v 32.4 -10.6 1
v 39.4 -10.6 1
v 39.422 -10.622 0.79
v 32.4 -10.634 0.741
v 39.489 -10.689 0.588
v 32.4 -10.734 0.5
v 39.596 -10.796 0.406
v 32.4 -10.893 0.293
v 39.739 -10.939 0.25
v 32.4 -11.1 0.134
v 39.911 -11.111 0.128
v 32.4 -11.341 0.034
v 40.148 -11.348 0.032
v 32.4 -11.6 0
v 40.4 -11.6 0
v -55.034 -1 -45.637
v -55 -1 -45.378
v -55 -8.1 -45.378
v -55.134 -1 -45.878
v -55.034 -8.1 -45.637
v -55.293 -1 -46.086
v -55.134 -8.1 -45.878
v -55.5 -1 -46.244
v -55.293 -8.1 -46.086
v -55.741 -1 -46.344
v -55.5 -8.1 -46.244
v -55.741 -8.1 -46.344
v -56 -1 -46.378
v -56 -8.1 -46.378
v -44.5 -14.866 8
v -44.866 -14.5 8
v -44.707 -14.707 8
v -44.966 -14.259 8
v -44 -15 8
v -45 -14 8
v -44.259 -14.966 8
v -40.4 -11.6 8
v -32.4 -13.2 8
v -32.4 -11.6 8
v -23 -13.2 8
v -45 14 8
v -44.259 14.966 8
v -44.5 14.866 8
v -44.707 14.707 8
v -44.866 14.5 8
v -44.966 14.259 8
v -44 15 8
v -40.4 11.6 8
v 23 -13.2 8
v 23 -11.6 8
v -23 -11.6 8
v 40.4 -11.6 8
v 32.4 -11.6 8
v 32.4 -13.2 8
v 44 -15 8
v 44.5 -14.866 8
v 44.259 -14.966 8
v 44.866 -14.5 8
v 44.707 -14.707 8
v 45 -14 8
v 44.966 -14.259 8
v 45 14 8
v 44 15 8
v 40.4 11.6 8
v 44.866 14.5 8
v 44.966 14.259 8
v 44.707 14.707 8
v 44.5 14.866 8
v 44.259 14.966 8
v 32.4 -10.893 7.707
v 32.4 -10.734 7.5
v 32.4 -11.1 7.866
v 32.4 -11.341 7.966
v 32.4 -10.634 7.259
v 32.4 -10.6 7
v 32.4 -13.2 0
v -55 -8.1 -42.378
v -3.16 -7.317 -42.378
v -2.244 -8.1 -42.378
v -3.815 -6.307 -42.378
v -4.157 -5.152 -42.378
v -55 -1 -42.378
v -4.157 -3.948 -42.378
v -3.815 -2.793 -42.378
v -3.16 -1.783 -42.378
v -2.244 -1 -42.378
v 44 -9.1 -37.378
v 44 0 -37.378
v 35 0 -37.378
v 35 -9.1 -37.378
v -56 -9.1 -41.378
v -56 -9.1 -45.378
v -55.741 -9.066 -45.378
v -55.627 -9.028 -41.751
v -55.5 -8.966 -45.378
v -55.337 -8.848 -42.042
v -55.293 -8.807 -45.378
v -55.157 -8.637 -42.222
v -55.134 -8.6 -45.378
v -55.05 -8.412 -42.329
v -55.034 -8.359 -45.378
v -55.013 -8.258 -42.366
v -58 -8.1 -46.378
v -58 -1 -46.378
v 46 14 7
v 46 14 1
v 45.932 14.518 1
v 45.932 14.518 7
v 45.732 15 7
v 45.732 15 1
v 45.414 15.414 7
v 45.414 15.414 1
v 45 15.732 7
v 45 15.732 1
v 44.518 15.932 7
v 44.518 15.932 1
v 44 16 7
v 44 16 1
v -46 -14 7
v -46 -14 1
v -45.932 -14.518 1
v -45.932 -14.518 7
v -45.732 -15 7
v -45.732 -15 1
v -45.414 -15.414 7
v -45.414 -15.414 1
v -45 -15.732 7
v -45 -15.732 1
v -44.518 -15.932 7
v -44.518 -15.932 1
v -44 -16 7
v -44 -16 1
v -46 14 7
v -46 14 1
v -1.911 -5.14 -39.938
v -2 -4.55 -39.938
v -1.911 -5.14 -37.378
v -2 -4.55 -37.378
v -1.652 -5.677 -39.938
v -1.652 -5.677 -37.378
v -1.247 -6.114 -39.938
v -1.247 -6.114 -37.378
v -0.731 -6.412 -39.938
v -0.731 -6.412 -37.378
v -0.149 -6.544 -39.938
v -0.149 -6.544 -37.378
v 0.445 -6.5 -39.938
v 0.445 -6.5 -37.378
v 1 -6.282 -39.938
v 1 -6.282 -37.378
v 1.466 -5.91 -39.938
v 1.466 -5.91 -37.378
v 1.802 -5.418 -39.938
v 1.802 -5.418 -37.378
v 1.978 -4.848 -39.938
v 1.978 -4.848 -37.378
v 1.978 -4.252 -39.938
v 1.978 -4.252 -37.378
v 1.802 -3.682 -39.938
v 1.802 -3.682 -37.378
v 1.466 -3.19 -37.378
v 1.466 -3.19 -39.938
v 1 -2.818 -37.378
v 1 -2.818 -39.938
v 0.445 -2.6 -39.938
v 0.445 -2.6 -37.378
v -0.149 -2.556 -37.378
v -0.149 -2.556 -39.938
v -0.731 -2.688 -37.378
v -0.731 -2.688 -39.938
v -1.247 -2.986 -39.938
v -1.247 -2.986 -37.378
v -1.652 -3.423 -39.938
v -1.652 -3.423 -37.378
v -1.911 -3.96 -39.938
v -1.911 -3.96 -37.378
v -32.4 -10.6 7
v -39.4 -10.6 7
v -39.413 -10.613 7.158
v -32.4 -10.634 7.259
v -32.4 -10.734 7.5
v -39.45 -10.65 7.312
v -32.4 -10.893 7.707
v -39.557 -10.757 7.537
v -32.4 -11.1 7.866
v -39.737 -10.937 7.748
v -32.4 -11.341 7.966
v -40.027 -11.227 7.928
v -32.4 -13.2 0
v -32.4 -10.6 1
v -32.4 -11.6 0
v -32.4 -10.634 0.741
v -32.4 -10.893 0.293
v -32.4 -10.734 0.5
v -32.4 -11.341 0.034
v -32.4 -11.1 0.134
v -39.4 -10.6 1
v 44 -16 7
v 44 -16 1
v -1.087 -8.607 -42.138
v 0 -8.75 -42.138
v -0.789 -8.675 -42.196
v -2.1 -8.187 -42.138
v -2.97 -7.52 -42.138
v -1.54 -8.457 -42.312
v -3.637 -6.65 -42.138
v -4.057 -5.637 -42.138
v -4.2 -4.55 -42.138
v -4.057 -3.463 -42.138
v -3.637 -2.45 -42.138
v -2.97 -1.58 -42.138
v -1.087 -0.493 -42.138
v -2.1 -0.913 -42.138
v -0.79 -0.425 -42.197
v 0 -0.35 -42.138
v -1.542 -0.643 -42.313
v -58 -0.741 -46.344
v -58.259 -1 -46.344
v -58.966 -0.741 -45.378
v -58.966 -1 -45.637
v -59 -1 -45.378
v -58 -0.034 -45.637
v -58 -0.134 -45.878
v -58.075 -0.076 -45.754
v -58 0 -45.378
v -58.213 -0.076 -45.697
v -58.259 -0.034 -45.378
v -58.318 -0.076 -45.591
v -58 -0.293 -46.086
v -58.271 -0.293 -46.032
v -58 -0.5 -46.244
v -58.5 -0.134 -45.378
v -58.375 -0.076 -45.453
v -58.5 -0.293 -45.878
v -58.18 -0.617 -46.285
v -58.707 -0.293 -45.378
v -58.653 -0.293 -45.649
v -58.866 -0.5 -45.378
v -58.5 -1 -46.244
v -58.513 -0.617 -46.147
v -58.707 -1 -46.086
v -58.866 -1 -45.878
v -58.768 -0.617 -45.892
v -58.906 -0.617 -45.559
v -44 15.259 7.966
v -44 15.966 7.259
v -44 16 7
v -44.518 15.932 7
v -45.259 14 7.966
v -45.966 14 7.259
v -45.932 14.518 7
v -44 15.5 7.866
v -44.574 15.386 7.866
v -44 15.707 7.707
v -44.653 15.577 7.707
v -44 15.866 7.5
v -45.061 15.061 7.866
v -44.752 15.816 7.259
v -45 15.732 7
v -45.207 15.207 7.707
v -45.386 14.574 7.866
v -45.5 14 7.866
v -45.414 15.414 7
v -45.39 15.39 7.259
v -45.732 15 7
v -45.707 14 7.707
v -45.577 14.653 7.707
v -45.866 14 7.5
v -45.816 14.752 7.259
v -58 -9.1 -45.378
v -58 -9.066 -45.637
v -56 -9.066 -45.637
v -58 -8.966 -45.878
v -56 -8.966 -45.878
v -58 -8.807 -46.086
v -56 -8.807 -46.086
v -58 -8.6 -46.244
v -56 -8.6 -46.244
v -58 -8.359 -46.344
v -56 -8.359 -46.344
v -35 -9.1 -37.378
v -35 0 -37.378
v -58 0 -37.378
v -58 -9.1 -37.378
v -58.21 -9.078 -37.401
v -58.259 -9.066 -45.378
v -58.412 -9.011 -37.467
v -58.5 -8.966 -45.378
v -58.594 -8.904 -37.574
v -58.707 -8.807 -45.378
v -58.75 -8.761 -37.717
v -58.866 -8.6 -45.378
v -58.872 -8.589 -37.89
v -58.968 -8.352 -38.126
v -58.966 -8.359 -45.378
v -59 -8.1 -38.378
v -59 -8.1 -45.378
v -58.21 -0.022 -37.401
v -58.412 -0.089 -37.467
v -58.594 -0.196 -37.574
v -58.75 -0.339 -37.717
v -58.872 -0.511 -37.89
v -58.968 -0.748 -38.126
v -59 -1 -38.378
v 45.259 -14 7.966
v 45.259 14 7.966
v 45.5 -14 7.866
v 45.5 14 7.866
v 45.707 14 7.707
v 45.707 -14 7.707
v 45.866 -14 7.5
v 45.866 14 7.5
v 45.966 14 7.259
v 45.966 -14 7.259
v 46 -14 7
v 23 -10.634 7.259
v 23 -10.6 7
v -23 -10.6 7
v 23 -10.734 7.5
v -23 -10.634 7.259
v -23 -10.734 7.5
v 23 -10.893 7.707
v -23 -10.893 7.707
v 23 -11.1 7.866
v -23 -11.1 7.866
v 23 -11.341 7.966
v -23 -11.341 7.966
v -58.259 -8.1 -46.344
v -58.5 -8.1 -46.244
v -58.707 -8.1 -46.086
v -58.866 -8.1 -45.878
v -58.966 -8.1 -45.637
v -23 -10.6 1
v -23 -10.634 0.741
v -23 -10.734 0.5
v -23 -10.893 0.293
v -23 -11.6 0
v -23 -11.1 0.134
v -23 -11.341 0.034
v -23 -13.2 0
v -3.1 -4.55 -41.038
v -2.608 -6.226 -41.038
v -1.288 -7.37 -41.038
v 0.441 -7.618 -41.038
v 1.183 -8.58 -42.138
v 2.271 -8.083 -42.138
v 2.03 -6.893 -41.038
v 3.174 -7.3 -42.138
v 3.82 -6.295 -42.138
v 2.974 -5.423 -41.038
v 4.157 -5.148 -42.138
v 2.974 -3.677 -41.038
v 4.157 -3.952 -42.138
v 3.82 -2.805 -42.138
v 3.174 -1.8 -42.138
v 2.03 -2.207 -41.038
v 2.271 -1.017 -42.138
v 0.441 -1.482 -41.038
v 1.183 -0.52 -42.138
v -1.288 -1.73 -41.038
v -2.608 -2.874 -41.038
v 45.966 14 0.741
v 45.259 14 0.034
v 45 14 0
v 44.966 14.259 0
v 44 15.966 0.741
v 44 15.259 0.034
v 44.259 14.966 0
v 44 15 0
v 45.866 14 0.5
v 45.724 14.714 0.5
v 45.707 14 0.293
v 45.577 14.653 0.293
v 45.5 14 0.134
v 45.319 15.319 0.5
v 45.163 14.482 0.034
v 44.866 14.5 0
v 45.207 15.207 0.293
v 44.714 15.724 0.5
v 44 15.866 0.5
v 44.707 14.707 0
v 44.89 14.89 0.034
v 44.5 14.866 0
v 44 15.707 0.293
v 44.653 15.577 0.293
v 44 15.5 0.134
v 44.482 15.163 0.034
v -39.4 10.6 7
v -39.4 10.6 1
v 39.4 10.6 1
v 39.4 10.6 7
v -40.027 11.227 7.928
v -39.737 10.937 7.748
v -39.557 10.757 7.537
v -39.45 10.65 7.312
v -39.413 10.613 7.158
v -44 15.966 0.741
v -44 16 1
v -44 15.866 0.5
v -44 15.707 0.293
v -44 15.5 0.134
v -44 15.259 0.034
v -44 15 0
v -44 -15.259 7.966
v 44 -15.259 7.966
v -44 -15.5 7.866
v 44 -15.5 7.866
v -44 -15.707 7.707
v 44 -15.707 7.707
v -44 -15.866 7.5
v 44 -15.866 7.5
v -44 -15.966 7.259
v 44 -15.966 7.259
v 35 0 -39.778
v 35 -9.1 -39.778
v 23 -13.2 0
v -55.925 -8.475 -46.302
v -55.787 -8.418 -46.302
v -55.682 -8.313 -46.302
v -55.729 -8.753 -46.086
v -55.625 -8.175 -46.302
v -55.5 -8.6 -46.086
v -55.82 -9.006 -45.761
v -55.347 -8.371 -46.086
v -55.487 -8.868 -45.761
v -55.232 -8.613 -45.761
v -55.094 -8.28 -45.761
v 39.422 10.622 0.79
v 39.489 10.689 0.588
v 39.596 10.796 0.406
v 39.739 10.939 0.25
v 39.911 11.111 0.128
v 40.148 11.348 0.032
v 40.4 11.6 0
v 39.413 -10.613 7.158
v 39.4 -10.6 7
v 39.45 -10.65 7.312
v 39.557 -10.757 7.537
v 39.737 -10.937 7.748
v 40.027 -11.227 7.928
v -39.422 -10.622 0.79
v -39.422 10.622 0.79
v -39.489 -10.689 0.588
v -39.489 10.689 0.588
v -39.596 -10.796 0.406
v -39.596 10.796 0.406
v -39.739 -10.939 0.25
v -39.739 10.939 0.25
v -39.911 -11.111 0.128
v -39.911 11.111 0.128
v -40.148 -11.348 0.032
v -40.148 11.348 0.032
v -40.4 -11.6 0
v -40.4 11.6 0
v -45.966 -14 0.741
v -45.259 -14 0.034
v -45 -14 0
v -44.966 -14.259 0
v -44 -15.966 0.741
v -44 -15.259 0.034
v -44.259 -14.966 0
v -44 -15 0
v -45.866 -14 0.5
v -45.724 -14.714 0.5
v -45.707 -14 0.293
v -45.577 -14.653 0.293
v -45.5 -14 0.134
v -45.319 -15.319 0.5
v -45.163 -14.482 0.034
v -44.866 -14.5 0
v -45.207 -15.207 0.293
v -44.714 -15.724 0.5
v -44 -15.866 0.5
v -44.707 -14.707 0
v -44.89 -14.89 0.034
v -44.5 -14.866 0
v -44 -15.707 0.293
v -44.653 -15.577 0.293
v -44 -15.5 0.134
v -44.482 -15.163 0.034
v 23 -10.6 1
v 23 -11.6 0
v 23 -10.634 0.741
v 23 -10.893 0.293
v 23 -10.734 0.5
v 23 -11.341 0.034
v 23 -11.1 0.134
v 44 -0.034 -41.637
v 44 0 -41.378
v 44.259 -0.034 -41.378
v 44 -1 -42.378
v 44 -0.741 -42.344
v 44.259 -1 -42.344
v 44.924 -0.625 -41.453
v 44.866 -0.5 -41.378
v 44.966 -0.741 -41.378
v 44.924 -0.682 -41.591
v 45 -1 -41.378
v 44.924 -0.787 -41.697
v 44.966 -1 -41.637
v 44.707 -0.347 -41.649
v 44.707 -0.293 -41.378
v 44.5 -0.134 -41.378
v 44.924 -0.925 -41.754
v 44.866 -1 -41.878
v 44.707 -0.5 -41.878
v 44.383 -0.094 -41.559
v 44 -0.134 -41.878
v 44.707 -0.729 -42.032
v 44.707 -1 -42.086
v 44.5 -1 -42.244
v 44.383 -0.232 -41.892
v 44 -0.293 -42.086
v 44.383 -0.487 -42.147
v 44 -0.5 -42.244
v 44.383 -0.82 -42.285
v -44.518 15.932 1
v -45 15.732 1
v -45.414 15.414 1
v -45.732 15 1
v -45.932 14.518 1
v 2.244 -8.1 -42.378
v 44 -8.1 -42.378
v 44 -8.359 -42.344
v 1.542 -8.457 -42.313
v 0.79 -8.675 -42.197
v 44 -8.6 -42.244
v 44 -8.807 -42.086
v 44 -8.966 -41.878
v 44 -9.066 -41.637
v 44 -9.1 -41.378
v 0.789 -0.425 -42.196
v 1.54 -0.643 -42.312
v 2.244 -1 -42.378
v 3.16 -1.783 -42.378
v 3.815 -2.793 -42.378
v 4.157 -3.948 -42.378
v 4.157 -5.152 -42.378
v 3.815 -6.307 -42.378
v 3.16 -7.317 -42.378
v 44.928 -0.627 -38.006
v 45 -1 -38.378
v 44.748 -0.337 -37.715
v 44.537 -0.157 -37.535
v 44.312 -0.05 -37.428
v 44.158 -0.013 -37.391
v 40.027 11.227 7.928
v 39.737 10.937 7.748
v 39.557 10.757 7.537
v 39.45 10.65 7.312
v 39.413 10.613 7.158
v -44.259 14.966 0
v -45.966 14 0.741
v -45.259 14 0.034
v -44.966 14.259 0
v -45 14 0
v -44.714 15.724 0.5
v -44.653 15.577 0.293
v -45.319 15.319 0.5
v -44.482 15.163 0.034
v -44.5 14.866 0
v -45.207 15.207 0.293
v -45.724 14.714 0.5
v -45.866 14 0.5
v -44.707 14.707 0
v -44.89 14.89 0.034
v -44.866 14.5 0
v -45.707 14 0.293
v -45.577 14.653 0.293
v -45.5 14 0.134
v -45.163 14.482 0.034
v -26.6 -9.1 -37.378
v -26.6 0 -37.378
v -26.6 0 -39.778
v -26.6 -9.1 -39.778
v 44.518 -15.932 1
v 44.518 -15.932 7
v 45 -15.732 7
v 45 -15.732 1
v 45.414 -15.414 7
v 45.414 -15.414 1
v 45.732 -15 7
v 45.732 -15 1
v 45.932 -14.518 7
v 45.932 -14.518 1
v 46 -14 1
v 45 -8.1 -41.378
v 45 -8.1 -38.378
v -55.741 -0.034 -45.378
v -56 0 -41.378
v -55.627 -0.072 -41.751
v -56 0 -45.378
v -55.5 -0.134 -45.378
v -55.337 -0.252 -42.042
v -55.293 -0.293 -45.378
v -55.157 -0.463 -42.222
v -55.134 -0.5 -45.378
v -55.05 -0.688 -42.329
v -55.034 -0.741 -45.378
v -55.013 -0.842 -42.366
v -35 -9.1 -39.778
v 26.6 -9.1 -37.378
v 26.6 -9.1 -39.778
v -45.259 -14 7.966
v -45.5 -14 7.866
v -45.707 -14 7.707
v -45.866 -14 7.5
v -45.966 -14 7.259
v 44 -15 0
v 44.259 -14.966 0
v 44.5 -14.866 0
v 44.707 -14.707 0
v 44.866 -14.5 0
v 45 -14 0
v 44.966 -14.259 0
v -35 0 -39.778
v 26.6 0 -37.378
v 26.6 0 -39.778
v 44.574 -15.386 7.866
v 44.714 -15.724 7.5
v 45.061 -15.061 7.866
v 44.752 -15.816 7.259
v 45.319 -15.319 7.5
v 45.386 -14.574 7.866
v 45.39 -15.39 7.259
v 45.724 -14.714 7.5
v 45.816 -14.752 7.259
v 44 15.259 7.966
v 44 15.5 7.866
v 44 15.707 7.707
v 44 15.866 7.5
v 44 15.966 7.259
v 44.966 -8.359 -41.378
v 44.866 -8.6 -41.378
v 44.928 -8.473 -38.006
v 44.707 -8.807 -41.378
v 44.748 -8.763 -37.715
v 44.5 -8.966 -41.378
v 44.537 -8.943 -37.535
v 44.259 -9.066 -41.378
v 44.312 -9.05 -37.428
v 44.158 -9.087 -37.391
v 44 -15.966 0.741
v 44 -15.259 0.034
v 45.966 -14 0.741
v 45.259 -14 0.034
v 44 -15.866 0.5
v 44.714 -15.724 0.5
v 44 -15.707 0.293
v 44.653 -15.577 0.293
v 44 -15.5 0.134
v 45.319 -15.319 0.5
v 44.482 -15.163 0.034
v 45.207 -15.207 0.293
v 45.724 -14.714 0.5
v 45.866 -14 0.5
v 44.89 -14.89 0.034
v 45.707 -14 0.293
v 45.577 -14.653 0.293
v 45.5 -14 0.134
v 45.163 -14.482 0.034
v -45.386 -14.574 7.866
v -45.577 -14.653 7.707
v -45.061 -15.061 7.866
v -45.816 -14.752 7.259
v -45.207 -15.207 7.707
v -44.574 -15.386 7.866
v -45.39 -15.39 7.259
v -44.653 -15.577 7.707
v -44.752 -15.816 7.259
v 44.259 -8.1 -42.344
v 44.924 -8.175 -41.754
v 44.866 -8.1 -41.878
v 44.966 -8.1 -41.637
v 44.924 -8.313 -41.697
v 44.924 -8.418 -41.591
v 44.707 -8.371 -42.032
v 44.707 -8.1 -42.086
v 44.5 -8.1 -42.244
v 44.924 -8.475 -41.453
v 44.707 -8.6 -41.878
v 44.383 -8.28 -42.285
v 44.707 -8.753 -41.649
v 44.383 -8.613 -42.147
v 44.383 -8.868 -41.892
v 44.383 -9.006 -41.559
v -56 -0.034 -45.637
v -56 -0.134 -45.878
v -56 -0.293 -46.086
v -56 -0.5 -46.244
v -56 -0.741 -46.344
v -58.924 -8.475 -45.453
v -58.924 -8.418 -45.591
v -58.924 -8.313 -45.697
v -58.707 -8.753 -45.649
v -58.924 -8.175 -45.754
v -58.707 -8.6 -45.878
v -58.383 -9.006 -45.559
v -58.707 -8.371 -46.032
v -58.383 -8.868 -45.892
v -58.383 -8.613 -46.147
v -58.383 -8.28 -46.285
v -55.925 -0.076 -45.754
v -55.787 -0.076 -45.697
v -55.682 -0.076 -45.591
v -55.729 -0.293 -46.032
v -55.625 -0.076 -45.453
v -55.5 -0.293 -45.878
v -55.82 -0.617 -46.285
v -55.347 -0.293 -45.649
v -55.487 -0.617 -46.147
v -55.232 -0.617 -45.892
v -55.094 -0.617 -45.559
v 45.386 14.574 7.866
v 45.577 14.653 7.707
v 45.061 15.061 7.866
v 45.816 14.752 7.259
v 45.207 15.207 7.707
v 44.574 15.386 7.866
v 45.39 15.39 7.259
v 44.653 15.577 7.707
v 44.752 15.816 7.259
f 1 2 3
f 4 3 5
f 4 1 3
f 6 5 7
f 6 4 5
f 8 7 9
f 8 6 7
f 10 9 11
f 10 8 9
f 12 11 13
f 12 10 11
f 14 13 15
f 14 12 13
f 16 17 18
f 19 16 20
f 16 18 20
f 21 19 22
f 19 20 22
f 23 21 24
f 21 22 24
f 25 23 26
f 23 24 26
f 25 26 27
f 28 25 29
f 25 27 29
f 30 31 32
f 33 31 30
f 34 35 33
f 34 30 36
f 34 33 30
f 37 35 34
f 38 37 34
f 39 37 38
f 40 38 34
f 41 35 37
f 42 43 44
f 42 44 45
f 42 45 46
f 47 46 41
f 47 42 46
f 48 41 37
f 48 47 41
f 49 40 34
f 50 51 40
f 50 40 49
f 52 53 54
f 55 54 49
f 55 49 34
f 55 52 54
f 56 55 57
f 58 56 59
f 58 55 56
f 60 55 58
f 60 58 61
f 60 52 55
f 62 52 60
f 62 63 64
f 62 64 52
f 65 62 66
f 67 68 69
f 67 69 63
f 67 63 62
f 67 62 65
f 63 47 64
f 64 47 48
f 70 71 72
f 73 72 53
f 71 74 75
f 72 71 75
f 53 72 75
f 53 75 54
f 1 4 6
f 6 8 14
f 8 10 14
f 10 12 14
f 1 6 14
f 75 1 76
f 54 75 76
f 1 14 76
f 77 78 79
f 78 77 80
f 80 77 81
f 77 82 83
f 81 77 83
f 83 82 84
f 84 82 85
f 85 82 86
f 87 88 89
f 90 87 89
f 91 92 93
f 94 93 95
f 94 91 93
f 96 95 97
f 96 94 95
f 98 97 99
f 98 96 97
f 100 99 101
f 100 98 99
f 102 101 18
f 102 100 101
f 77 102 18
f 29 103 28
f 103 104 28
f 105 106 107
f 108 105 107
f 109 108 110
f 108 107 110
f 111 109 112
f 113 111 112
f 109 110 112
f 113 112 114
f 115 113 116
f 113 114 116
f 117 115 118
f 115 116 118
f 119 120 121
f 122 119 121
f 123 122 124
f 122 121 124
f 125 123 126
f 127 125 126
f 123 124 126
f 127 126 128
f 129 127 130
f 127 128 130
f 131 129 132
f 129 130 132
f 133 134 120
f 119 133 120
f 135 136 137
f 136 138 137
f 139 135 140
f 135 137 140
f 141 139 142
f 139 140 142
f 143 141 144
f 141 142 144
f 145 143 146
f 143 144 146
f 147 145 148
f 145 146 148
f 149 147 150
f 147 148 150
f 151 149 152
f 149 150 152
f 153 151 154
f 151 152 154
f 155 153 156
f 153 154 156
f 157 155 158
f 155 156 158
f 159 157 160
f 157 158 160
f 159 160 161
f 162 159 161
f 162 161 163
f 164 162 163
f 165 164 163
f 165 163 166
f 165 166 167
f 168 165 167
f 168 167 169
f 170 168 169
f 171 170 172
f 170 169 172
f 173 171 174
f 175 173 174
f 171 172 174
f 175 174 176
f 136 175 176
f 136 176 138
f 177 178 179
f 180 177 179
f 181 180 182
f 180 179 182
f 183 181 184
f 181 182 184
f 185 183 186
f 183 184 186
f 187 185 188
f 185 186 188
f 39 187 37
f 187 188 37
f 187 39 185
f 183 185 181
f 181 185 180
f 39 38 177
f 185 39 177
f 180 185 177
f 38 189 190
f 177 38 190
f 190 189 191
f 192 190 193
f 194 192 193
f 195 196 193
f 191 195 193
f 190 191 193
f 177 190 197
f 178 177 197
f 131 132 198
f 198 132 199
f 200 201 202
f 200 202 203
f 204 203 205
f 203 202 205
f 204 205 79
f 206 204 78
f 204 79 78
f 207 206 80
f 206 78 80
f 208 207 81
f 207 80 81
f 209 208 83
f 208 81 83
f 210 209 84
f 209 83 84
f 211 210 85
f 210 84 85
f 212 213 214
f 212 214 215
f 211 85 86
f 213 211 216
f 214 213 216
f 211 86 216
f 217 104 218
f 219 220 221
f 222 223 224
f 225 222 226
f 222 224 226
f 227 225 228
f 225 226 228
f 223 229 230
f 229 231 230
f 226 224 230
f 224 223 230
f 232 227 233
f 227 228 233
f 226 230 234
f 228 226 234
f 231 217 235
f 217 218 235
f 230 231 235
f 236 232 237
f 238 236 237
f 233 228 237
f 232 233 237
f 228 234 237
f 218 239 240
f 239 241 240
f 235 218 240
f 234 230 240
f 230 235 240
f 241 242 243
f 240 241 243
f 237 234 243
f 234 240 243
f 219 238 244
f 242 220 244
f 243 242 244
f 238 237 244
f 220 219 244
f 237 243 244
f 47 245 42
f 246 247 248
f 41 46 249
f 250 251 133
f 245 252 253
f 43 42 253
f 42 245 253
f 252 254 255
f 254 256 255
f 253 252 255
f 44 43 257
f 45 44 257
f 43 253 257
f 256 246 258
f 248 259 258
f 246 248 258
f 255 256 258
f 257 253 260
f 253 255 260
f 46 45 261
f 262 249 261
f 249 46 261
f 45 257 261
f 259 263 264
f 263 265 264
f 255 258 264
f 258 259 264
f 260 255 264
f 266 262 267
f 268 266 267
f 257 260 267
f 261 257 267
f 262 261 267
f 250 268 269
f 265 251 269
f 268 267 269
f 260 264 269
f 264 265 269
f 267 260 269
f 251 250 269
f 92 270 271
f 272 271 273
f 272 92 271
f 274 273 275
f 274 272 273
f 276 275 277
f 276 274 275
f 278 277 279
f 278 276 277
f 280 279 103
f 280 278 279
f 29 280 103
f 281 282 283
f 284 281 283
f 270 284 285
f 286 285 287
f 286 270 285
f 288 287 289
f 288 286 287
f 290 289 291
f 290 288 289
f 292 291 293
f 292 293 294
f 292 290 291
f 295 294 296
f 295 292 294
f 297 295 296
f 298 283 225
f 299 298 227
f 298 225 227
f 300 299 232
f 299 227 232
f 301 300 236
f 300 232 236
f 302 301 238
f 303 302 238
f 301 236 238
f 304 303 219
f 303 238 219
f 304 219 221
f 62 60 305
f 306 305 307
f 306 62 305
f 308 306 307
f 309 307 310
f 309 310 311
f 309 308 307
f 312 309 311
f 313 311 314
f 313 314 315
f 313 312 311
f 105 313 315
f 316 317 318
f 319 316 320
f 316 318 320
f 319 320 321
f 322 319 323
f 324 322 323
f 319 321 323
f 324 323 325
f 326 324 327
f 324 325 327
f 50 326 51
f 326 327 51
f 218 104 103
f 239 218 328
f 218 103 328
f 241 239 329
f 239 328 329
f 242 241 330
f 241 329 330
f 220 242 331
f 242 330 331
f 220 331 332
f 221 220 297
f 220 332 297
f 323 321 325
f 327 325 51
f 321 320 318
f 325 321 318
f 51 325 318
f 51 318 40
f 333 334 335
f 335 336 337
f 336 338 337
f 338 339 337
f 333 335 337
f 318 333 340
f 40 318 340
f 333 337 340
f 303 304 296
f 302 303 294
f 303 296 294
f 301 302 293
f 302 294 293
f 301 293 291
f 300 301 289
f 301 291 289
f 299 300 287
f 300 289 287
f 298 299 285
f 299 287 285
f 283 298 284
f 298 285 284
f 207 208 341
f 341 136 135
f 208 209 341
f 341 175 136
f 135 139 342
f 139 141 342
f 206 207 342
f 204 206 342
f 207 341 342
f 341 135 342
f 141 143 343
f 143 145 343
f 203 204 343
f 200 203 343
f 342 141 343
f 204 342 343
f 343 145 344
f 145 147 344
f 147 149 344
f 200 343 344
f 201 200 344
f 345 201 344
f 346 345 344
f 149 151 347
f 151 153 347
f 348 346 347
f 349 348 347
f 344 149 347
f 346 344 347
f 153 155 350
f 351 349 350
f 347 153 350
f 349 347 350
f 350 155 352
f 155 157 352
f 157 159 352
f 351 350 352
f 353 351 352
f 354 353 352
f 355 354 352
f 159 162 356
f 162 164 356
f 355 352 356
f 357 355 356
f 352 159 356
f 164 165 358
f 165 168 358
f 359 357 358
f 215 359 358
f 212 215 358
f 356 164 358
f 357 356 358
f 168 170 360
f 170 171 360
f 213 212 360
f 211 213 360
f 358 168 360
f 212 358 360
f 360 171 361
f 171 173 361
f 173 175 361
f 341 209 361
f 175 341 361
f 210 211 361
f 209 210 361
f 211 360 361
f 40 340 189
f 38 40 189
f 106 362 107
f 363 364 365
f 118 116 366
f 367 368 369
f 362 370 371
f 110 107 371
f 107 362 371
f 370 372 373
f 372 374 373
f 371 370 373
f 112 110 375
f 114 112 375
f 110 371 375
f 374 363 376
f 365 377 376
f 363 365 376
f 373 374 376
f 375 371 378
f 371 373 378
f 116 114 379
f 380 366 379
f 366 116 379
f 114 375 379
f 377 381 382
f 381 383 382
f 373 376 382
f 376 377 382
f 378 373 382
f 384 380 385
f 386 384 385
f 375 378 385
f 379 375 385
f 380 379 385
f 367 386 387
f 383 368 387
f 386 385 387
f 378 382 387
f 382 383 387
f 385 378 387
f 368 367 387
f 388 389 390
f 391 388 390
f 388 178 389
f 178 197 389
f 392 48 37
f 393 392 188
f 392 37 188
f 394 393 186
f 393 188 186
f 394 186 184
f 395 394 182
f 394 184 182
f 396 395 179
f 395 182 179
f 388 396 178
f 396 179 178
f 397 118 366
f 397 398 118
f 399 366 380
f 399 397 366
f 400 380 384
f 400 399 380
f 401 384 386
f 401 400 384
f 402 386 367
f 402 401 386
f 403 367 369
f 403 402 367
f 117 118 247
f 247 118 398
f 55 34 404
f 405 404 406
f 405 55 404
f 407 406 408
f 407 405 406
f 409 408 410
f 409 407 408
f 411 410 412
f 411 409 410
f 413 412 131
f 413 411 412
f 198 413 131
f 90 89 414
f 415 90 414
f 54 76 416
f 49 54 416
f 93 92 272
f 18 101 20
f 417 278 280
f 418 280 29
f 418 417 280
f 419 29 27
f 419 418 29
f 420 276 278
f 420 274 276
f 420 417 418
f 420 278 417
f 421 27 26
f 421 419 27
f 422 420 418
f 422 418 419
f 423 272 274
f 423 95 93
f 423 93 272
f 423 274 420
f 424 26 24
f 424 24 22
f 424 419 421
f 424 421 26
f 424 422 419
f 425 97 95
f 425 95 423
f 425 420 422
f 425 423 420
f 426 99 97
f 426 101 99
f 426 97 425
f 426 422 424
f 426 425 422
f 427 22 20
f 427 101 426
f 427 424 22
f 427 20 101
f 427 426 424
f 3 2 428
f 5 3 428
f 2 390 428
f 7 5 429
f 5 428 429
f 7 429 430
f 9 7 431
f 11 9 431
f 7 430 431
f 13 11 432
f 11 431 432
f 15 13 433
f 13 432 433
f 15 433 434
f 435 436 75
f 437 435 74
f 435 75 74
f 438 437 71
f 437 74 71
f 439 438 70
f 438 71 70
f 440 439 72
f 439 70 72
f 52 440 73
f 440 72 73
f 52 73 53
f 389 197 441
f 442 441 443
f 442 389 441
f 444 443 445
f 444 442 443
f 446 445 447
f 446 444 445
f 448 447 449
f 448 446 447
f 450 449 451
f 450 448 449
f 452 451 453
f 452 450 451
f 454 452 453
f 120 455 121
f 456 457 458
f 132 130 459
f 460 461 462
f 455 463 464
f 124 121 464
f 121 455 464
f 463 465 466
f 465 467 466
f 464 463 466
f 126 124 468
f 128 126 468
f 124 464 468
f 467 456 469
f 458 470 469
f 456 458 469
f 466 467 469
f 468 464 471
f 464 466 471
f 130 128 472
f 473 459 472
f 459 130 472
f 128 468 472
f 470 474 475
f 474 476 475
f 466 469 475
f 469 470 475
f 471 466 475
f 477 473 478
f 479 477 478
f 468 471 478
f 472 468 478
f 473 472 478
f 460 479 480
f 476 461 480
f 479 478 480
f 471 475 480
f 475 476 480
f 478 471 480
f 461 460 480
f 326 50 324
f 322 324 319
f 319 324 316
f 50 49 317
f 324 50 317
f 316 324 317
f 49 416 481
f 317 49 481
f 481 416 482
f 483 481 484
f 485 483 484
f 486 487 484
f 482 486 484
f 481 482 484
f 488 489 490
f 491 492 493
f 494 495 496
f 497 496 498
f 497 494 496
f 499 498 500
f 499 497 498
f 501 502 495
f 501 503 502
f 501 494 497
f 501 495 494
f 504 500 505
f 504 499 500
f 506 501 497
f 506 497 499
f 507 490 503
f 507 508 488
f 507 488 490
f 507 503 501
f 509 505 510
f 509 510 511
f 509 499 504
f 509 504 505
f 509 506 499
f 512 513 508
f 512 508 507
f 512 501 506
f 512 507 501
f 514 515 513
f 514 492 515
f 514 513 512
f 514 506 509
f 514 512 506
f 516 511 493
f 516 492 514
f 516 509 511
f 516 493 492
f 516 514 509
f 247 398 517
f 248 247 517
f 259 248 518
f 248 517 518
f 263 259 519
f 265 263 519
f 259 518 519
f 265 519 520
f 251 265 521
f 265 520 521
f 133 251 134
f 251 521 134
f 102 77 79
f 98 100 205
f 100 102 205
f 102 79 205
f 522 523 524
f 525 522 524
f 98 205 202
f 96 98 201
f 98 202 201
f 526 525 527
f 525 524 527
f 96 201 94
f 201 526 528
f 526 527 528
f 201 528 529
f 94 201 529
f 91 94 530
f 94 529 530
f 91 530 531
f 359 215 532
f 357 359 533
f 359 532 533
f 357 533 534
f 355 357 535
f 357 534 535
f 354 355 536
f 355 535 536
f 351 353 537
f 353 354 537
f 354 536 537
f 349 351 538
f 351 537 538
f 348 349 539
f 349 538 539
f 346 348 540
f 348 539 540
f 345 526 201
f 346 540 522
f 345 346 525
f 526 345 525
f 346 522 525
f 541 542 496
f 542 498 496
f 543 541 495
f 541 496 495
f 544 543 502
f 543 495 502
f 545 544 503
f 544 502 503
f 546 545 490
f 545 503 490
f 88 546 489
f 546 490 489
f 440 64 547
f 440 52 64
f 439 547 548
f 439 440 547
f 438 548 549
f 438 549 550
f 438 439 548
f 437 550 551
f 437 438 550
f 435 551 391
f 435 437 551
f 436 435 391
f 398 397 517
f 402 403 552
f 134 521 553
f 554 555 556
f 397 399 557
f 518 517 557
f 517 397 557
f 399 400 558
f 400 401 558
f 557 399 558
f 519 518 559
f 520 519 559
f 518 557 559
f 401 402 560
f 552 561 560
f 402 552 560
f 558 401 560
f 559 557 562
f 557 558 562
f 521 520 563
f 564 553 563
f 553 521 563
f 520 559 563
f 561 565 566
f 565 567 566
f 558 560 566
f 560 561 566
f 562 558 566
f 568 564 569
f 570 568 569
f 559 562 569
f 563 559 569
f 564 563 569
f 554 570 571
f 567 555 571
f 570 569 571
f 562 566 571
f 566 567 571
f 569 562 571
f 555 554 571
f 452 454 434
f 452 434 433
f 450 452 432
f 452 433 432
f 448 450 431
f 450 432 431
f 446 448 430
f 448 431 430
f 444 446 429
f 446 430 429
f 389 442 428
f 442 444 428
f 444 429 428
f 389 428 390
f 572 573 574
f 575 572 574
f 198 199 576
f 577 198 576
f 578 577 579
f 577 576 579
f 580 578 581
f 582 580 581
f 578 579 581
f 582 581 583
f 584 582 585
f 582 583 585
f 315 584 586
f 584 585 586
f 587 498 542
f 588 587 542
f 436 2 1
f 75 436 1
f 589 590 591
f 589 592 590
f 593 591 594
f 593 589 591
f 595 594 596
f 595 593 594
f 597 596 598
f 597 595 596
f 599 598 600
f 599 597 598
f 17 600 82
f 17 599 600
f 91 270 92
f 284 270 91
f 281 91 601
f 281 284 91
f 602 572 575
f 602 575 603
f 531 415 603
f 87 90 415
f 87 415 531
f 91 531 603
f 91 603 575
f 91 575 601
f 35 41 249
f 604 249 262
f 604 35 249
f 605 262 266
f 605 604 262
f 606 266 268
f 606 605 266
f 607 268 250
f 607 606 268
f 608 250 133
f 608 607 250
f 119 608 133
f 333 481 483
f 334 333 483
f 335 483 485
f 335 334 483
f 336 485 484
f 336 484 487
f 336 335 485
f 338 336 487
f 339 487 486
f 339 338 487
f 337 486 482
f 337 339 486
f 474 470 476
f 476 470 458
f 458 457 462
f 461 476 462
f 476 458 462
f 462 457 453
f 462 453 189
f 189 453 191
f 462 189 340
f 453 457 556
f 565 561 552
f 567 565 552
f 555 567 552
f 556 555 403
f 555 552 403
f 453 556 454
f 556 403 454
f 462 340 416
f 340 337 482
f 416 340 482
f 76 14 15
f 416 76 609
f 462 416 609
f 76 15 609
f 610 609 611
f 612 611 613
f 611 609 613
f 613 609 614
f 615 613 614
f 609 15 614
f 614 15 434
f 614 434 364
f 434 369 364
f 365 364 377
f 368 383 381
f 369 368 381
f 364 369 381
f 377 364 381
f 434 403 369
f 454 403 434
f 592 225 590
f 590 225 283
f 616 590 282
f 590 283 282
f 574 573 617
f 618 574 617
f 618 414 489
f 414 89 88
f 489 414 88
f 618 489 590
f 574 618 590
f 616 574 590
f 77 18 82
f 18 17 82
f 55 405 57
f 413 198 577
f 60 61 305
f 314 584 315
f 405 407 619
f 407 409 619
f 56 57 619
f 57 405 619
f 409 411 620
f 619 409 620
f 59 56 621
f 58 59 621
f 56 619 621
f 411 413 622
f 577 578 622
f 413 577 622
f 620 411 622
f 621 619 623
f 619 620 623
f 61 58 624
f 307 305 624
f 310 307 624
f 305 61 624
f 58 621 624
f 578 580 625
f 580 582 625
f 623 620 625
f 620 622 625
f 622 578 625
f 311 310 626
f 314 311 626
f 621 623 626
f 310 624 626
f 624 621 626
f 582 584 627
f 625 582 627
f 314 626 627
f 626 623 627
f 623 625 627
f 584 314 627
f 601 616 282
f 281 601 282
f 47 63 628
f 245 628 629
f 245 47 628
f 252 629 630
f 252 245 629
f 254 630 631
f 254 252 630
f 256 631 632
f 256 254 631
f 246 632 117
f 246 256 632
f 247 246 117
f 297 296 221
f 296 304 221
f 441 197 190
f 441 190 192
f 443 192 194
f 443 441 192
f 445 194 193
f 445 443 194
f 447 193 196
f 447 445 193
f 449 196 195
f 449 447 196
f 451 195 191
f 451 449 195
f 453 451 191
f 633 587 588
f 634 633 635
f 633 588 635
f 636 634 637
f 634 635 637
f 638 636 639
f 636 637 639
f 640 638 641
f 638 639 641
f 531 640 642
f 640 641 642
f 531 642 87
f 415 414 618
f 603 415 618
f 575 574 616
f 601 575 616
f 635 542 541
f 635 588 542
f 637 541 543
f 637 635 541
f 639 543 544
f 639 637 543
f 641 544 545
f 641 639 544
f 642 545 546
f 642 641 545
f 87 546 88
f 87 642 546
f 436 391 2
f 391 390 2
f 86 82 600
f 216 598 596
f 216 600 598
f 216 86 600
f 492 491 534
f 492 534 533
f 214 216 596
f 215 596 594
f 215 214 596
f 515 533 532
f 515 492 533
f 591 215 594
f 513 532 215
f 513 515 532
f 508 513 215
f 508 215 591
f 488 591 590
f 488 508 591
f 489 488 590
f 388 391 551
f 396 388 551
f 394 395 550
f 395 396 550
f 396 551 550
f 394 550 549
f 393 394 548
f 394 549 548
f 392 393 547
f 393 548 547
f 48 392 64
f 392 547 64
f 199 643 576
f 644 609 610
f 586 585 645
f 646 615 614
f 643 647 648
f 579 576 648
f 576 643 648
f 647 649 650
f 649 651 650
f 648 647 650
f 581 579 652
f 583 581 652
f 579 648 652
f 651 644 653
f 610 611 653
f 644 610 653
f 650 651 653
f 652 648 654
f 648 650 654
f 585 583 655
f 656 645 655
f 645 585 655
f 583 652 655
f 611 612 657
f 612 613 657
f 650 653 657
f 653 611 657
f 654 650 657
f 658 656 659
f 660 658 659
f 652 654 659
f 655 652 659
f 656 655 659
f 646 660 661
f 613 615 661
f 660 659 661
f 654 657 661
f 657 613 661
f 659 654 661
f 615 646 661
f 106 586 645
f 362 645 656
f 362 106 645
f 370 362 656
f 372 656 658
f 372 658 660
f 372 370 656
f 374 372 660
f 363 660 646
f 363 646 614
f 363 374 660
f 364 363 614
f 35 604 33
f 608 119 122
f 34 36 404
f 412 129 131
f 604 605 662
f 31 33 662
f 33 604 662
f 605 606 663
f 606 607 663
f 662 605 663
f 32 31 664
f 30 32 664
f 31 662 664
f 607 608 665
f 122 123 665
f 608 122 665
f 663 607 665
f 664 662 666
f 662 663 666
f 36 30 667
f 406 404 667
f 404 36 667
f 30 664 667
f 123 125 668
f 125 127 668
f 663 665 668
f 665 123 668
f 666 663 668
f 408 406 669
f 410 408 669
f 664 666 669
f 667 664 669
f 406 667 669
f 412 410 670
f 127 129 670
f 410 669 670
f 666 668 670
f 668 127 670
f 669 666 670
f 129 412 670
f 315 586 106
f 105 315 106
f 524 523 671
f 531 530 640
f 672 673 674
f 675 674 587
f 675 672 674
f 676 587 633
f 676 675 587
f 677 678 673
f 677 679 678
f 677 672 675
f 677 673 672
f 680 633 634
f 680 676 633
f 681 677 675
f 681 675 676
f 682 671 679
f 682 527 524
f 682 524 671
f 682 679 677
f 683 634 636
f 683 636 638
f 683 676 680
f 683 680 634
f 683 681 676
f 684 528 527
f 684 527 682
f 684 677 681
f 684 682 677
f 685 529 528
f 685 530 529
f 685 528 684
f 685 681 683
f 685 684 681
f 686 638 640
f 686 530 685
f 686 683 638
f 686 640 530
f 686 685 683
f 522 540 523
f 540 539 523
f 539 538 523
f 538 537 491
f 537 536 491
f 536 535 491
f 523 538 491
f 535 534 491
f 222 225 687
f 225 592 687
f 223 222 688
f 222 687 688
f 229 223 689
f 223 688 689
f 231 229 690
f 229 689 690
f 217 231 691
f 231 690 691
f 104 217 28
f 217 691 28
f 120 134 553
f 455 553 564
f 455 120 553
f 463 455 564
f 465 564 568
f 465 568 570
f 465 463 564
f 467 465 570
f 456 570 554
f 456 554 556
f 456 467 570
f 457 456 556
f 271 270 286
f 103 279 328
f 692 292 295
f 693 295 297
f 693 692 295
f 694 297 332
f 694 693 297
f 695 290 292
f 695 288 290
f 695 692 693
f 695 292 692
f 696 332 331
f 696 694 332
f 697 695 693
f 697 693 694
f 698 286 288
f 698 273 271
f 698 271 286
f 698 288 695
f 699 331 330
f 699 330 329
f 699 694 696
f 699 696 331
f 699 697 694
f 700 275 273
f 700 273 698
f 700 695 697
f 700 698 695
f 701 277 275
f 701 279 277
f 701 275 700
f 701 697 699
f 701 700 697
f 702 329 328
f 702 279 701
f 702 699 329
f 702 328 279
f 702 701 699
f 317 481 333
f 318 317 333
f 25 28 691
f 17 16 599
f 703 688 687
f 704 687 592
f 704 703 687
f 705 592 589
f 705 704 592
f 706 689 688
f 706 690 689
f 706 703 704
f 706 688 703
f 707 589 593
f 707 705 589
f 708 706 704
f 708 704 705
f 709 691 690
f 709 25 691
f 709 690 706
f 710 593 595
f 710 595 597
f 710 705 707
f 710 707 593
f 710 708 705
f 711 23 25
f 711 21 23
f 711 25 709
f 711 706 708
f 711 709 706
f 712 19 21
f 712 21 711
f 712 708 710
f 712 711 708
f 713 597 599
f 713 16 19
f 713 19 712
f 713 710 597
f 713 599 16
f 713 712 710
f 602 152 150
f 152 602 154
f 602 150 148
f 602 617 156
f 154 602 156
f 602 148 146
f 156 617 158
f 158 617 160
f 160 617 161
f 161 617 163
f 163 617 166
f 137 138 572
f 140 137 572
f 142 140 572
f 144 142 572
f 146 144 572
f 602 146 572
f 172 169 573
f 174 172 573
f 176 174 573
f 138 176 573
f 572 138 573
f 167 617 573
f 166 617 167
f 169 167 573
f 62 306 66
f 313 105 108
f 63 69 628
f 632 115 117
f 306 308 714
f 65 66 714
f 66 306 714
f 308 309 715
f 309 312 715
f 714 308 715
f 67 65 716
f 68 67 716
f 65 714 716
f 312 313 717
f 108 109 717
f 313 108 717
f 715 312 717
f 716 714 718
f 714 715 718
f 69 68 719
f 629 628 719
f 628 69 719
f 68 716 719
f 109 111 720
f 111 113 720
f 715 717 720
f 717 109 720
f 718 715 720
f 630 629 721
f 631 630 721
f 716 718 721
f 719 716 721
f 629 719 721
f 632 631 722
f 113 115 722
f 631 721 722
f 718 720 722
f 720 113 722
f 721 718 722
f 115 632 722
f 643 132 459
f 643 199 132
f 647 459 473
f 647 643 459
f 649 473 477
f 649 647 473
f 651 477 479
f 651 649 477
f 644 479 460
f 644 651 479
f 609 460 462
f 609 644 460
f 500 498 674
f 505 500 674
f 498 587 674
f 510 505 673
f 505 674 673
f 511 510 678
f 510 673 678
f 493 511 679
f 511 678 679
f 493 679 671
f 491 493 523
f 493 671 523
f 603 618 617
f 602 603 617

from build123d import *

# Parameters (mm, degrees)
F1_DEPTH       = 8
F2_W           = 10
F2_H           = 5
F3_DEPTH       = 9.1
F4_R           = 1
F6_R           = 1
F7_D           = 4
F7_START       = 0.2400659
F7_CSINK_D     = 8.4
F7_CSINK_ANGLE = 90
F8_R           = 1
F9_R           = 1
F10_R          = 1
F11_R          = 1
F12_R          = 1


# Not quite as in the source:
# - a feature names something its author has since deleted; it is built from what else it names


with BuildPart() as f1:
    # F0 (on Top) → F1 (new body)
    with BuildSketch(Plane.XY):
        with BuildLine():
            Line((-44, -16), (44, -16))
            ThreePointArc((44, -16), (45.4142135624, -15.4142135624), (46, -14))
            Line((46, -14), (46, 14))
            ThreePointArc((46, 14), (45.4142135624, 15.4142135624), (44, 16))
            Line((44, 16), (-44, 16))
            ThreePointArc((-44, 16), (-45.4142135624, 15.4142135624), (-46, 14))
            Line((-46, 14), (-46, -14))
            ThreePointArc((-46, -14), (-45.4142135624, -15.4142135624), (-44, -16))
        make_face()
        Polygon((39.4, 10.6), (39.4, -10.6), (32.4, -10.6), (32.4, -13.2), (23, -13.2), (23, -10.6), (-23, -10.6), (-23, -13.2), (-32.4, -13.2), (-32.4, -10.6), (-39.4, -10.6), (-39.4, 10.6), align=None, mode=Mode.SUBTRACT)
    extrude(amount=F1_DEPTH)

    # F4
    f4_edges = [f1.edges().sort_by_distance(p)[0] for p in [
        (0, -10.6, 0),
        (35.9, -10.6, 0),
        (35.9, -10.6, 8),
        (0, -10.6, 8),
        (-35.9, -10.6, 8),
        (-35.9, -10.6, 0),
    ]]
    fillet(f4_edges, radius=F4_R)

    # F9
    f9_edges = [f1.edges().sort_by_distance(p)[0] for p in [
        (0, 10.6, 0),
        (0, 10.6, 8),
    ]]
    fillet(f9_edges, radius=F9_R)

    # F10
    f10_edges = [f1.edges().sort_by_distance(p)[0] for p in [
        (46, 0, 0),
        (0, 16, 0),
        (45.414214, 15.414214, 0),
        (-46, 0, 0),
        (-45.414214, 15.414214, 0),
        (46, 0, 8),
        (0, 16, 8),
        (45.414214, 15.414214, 8),
        (-46, 0, 8),
        (-45.414214, 15.414214, 8),
    ]]
    fillet(f10_edges, radius=F10_R)

    # F11
    f11_edges = [f1.edges().sort_by_distance(p)[0] for p in [
        (39.4, 0, 8),
        (-39.4, 0, 8),
        (-39.4, 0, 0),
        (39.4, 0, 0),
    ]]
    fillet(f11_edges, radius=F11_R)


with BuildPart() as f3:
    # F2 (on Front) → F3 (new body)
    with BuildSketch(Plane.XZ):
        Polygon((-45, -37.3784252584), (-45, -42.3784252584), (45, -42.3784252584), (45, -37.3784252584), (35, -37.3784252584), (35, -39.7784252584), (26.6, -39.7784252584), (26.6, -37.3784252584), (-26.6, -37.3784252584), (-26.6, -39.7784252584), (-35, -39.7784252584), (-35, -37.3784252584), align=None)
        with Locations((-50, -39.8784252584)):
            Rectangle(F2_W, F2_H)
        Polygon((-55, -46.3784252584), (-55, -42.3784252584), (-55, -37.3784252584), (-59, -37.3784252584), (-59, -46.3784252584), align=None)
    extrude(amount=F3_DEPTH)

    # F6
    f6_edges = [f3.edges().sort_by_distance(p)[0] for p in [
        (-5, -9.1, -42.378425),
        (-5, 0, -42.378425),
    ]]
    fillet(f6_edges, radius=F6_R)

    # F7 (through all)
    # its depths count from where the whole tool has entered the part; down to there all is cleared
    with Locations(Plane(origin=(0, 0, -42.3784252584), x_dir=(1, 0, 0), z_dir=(0, 0, -1)).offset(-F7_START)):
        with Locations((0, 4.55)):
            CounterSinkHole(F7_D / 2, F7_CSINK_D / 2, counter_sink_angle=F7_CSINK_ANGLE)

    # F8
    f8_edges = [f3.edges().sort_by_distance(p)[0] for p in [
        (45, -4.55, -42.378425),
        (45, -4.55, -37.378425),
    ]]
    fillet(f8_edges, radius=F8_R)

    # F12
    f12_edges = [f3.edges().sort_by_distance(p)[0] for p in [
        (-55, -9.1, -43.878425),
        (-57, -9.1, -46.378425),
        (-59, -9.1, -41.878425),
        (-55, -4.55, -46.378425),
        (-59, -4.55, -46.378425),
        (-57, 0, -46.378425),
        (-55, 0, -43.878425),
        (-59, 0, -41.878425),
        (-59, -4.55, -37.378425),
    ]]
    fillet(f12_edges, radius=F12_R)


solid = Compound([f1.part, f3.part])
